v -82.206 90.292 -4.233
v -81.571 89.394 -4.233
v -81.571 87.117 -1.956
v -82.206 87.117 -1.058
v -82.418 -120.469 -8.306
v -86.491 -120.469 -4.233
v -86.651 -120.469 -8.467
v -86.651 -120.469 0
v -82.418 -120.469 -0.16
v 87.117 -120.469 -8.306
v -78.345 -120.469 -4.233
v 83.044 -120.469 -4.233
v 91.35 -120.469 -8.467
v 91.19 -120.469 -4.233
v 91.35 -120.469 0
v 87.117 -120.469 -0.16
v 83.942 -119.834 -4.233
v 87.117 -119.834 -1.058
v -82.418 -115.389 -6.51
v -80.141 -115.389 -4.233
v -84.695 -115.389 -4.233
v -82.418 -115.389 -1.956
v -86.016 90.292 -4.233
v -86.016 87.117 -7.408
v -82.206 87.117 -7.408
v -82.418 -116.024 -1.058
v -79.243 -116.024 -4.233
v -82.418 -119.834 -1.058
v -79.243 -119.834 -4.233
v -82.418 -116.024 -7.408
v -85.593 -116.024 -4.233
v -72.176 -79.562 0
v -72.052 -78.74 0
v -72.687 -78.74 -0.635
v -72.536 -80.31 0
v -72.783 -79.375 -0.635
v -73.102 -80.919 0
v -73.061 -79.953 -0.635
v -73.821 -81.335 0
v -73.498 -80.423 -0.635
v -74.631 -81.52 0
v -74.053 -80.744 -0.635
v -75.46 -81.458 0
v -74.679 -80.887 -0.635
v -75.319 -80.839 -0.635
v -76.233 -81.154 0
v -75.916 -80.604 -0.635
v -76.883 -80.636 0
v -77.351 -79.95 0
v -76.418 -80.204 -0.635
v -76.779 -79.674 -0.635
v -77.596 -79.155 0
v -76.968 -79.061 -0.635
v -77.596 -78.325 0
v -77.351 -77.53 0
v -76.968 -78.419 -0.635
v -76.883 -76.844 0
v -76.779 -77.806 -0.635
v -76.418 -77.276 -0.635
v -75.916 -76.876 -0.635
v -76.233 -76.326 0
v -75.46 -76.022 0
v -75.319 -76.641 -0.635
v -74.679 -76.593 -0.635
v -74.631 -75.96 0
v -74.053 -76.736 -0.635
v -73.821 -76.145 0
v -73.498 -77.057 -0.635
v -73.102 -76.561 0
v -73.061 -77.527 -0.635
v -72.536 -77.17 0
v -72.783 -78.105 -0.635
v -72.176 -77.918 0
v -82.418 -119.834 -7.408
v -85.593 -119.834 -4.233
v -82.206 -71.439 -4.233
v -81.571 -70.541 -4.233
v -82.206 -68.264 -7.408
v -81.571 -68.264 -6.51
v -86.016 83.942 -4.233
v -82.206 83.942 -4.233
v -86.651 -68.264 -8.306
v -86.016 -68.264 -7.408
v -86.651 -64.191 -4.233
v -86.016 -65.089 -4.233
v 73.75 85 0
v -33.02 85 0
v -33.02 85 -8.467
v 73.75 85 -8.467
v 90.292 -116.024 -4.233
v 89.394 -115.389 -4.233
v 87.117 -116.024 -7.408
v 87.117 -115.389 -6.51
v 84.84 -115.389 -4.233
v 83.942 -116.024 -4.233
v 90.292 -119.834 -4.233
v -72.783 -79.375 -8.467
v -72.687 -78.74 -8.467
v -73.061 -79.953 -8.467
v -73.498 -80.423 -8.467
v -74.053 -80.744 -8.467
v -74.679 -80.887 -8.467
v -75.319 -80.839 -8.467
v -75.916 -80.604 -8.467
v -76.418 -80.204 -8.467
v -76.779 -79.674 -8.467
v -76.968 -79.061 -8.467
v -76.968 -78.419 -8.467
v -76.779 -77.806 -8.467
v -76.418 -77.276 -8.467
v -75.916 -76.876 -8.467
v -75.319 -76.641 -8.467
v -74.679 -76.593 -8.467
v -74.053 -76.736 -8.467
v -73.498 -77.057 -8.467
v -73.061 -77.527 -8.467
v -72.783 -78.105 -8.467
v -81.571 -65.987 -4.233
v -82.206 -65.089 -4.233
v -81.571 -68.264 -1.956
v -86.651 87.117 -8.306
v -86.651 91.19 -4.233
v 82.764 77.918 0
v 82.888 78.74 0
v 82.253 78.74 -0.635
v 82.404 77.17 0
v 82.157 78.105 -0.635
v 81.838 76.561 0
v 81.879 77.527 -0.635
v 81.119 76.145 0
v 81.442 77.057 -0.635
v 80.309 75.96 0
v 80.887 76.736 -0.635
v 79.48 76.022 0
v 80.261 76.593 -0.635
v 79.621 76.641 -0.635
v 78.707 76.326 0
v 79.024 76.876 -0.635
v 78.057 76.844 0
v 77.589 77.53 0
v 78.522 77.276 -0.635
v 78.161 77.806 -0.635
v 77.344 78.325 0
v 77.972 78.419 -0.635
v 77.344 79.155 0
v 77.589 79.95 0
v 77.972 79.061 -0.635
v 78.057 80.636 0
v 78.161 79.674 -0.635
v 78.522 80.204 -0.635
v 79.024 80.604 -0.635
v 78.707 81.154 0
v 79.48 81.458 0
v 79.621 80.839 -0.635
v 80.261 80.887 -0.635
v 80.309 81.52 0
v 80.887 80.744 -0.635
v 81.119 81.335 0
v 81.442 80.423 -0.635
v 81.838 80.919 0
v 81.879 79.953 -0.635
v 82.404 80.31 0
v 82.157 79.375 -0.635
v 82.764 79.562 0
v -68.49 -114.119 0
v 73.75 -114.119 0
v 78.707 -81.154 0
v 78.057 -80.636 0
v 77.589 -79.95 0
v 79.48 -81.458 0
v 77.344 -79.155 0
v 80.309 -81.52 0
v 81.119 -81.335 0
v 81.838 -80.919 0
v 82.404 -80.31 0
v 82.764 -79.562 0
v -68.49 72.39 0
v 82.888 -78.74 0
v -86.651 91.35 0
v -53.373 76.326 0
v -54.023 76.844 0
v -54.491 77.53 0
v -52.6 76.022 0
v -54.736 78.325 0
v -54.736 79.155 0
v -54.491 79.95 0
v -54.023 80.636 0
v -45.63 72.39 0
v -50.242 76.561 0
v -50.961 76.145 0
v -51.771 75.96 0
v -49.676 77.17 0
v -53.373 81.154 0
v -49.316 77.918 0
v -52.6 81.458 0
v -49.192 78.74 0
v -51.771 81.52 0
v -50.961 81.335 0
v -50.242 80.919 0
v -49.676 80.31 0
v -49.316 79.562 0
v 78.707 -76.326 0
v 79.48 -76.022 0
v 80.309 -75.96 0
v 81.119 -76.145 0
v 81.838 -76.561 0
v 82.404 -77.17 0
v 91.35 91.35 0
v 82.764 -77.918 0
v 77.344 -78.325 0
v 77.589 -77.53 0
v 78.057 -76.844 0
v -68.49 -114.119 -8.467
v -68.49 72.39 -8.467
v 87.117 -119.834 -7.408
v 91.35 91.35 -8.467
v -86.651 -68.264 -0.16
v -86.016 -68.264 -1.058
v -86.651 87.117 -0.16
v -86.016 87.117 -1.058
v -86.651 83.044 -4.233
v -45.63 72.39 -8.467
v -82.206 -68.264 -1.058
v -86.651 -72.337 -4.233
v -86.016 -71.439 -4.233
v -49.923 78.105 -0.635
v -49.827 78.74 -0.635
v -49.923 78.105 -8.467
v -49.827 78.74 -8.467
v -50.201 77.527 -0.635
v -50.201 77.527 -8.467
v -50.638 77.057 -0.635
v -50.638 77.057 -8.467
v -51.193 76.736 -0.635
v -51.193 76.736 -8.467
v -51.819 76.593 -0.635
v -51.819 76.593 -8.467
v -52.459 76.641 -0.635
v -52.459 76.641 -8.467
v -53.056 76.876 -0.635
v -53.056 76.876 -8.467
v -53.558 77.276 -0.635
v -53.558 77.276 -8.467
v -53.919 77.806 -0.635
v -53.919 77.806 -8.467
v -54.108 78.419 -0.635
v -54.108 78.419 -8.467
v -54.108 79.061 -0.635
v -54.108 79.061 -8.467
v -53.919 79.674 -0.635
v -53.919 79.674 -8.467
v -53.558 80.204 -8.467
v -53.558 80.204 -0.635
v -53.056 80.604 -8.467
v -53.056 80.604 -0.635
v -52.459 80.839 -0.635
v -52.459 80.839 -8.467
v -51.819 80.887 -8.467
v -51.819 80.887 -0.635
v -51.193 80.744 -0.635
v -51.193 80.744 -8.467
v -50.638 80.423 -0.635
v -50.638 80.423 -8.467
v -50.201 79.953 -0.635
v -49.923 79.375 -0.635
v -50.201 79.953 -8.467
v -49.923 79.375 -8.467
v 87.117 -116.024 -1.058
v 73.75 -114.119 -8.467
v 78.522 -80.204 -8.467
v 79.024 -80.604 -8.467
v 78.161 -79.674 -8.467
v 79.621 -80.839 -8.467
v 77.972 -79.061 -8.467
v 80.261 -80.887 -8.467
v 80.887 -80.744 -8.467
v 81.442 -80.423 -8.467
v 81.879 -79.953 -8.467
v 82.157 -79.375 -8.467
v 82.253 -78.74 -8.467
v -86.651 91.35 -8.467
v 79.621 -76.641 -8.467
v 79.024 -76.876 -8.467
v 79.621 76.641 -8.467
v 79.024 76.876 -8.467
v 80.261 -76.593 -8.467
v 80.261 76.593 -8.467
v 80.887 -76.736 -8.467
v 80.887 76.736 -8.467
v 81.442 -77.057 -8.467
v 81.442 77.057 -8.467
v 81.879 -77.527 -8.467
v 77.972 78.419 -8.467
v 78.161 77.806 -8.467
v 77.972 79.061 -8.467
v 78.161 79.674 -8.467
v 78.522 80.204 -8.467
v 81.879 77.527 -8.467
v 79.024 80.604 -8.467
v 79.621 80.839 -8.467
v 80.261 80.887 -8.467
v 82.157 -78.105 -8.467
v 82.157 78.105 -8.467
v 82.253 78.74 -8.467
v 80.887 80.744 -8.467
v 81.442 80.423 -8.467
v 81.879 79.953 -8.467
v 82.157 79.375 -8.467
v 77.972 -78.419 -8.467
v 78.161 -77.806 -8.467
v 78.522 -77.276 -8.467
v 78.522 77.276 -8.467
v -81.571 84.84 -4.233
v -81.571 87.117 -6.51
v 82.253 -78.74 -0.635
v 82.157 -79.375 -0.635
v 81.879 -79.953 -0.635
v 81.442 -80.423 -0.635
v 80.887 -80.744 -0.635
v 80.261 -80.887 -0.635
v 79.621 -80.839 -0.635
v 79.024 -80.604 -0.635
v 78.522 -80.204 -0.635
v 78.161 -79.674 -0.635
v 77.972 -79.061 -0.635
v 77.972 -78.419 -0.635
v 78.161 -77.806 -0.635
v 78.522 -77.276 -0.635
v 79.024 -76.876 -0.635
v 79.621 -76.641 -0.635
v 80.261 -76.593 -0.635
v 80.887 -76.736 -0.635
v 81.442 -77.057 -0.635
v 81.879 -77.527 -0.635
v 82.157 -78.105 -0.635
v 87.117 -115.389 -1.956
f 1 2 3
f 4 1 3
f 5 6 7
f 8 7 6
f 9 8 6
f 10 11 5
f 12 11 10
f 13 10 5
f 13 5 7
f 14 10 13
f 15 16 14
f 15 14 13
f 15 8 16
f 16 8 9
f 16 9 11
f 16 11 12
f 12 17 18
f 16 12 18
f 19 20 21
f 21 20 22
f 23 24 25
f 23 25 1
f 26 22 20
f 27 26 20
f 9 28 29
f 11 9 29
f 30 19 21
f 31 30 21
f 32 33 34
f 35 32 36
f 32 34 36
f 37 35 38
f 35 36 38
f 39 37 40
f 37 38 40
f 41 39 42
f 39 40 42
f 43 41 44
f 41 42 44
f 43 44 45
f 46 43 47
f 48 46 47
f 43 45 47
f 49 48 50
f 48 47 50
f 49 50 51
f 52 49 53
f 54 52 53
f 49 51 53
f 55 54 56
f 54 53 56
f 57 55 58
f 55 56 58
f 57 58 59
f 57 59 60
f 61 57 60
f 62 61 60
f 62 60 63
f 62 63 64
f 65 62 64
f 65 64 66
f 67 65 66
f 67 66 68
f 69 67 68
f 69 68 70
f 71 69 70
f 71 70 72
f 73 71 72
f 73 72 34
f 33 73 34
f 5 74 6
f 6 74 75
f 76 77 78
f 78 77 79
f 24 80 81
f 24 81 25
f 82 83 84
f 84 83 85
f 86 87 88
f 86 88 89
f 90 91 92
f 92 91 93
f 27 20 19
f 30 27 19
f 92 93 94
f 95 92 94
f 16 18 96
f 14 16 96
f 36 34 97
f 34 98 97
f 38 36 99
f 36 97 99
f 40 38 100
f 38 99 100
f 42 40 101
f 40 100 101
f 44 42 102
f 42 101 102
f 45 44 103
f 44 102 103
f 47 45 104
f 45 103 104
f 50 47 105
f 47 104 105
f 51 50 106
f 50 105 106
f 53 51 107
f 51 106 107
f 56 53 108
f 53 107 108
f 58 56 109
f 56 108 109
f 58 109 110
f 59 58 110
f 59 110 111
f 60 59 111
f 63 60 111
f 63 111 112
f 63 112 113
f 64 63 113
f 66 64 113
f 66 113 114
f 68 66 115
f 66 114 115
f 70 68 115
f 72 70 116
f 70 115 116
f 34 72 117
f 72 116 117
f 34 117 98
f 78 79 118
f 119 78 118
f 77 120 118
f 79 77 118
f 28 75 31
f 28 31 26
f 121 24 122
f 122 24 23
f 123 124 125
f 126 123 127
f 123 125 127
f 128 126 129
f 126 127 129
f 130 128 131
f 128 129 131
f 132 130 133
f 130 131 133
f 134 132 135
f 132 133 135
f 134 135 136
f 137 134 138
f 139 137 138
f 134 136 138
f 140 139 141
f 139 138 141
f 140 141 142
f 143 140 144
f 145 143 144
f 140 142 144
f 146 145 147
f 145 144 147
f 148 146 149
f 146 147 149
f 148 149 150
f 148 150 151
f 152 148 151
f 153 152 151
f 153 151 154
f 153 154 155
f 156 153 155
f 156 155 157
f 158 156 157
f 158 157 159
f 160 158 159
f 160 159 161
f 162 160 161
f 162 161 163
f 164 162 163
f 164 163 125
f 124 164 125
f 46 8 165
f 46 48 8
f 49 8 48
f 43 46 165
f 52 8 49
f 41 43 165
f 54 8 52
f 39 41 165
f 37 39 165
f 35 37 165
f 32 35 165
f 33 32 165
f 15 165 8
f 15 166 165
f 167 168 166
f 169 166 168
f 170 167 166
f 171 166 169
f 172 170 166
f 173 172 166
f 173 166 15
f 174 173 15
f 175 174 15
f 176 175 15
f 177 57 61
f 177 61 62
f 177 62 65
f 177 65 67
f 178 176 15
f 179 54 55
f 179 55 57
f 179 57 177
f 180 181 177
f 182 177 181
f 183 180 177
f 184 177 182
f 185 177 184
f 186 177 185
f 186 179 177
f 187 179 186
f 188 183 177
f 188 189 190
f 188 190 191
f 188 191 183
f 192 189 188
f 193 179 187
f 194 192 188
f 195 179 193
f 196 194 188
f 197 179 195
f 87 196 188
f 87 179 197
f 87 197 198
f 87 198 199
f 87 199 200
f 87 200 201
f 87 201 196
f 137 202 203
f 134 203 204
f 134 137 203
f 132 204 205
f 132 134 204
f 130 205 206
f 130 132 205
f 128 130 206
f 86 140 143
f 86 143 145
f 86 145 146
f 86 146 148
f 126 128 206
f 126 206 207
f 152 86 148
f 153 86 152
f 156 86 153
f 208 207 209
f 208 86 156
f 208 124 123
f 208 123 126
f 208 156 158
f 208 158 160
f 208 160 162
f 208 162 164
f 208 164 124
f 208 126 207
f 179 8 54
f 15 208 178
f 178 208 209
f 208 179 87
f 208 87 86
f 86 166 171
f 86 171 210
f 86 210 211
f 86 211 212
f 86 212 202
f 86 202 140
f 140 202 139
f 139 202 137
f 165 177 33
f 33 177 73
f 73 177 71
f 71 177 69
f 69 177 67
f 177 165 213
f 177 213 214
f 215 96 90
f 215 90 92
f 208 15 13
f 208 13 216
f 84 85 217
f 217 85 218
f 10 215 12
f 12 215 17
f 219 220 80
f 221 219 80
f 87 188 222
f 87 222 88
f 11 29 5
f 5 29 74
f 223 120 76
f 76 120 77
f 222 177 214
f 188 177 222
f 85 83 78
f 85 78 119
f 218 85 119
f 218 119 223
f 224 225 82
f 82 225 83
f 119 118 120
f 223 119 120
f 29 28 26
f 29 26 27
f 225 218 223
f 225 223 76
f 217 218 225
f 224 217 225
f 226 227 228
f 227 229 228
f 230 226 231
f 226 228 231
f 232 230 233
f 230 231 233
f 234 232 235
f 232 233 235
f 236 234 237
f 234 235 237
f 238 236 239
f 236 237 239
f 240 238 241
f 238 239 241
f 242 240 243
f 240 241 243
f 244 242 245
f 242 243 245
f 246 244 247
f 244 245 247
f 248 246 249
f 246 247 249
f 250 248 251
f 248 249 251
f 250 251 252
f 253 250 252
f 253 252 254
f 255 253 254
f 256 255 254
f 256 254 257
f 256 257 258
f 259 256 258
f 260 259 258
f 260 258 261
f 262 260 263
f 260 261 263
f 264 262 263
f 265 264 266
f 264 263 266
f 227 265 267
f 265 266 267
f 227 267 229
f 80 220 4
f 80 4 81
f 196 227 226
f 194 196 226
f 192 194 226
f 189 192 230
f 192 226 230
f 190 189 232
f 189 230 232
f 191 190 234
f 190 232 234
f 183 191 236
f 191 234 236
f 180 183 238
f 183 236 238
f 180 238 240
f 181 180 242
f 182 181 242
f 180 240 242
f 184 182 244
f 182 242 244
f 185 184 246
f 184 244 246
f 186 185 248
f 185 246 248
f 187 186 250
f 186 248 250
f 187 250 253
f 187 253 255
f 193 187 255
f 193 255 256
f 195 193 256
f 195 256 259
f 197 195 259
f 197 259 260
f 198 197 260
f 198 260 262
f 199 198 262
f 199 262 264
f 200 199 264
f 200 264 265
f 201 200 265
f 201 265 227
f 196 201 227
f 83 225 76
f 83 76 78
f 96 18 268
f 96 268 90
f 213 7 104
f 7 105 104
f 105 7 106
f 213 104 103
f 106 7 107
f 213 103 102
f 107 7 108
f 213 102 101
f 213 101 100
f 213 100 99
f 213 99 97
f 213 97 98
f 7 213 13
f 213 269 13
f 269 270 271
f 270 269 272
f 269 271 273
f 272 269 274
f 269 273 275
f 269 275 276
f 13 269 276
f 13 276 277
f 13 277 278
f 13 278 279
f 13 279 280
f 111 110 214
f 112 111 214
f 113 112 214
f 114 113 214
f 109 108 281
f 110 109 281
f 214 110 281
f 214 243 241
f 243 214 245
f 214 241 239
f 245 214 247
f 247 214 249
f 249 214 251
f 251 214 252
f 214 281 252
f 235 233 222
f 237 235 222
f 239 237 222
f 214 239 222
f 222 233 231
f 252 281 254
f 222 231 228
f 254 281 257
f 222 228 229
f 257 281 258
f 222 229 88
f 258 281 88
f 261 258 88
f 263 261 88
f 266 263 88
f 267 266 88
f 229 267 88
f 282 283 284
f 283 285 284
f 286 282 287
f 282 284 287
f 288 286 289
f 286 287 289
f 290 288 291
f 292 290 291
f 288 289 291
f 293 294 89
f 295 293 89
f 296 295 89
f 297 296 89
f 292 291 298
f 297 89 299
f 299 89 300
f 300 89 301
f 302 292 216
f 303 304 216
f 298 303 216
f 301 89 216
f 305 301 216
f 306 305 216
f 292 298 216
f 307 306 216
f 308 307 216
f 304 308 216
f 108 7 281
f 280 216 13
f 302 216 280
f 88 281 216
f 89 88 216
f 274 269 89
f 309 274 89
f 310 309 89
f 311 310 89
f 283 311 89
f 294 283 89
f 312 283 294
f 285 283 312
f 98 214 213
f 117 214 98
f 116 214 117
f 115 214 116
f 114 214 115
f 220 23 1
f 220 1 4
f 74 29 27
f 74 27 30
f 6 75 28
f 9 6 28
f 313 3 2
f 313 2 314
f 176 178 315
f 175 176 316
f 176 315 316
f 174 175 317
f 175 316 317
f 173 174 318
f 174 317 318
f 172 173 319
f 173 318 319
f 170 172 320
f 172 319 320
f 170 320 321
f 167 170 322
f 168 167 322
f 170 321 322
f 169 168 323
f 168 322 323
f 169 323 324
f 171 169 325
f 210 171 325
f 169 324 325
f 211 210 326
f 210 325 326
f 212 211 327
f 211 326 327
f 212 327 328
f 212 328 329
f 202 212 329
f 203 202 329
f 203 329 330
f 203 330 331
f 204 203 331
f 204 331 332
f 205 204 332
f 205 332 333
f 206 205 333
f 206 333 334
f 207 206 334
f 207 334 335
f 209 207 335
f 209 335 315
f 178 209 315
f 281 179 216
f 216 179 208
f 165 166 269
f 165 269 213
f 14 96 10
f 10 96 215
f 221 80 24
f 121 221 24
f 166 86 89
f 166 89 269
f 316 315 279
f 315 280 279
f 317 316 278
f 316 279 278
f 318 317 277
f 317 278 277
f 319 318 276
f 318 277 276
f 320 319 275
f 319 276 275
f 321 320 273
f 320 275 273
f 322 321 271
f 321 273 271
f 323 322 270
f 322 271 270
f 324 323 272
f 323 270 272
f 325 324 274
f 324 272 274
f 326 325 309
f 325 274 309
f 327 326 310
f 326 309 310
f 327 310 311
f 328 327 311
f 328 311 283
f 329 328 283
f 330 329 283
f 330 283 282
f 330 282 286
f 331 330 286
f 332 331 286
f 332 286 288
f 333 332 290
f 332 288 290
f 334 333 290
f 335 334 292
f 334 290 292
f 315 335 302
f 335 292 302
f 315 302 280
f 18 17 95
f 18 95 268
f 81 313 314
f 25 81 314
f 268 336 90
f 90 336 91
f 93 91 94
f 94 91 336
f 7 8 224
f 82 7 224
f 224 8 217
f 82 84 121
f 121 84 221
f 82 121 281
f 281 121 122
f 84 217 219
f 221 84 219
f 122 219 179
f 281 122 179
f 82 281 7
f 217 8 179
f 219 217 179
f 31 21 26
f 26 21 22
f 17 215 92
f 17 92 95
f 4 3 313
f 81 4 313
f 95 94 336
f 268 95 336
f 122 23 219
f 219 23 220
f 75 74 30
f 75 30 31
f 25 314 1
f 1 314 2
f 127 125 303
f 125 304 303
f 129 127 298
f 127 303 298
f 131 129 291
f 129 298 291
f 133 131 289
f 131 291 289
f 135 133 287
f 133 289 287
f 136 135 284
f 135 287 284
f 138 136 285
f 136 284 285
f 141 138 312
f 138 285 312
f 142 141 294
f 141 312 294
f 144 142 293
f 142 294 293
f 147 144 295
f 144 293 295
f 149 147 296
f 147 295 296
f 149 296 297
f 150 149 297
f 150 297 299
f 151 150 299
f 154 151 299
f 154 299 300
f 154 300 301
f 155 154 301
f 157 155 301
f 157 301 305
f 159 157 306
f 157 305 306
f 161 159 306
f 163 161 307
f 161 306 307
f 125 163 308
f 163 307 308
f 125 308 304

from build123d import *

# Parameters (mm, degrees)
SKETCH3_W                              = 178.001
SKETCH3_H                              = 211.818599984
BOSS_EXTRUDE1_DEPTH                    = 8.466666582
F_18_0_1695_DIAMETER_HOLE1_D           = 4.3053
F_18_0_1695_DIAMETER_HOLE1_CSINK_D     = 5.5753
F_18_0_1695_DIAMETER_HOLE1_CSINK_ANGLE = 90
CUT_EXTRUDE1_DEPTH                     = 5.08
CUT_EXTRUDE2_DEPTH                     = 5.08
CHAMFER1_SIZE                          = 0.635


with BuildPart() as part:
    # Sketch3 → Boss-Extrude1 (new body)
    with BuildSketch(Plane.XY):
        with Locations((2.3495, -14.559299992)):
            Rectangle(SKETCH3_W, SKETCH3_H)
        Polygon((-33.01966, 85), (73.75034, 85), (73.75034, -114.118599984), (-68.48966, -114.118599984), (-68.48966, 72.39), (-45.62966, 72.39), align=None, mode=Mode.SUBTRACT)
    extrude(amount=-BOSS_EXTRUDE1_DEPTH)

    # #18 (0.1695) Diameter Hole1 (through all)
    with Locations(Plane(origin=(0, 0, 0), x_dir=(-1, 0, 0), z_dir=(0, 0, 1))):
        with Locations((51.97966, -78.74), (74.83966, 78.74), (-80.10034, 78.74), (-80.10034, -78.74)):
            CounterSinkHole(F_18_0_1695_DIAMETER_HOLE1_D / 2, F_18_0_1695_DIAMETER_HOLE1_CSINK_D / 2, counter_sink_angle=F_18_0_1695_DIAMETER_HOLE1_CSINK_ANGLE)

    # Sketch9 → Cut-Extrude1 (cut)
    with BuildSketch(Plane.ZY.offset(86.651)):
        Polygon((-4.233333333, -65.0886), (-1.058333333, -68.2636), (-4.233333333, -71.4386), (-7.408333333, -68.2636), align=None)
        Polygon((-4.233333333, 90.291666667), (-1.058333333, 87.116666667), (-4.233333333, 83.941666667), (-7.408333333, 87.116666667), align=None)
    extrude(amount=-CUT_EXTRUDE1_DEPTH, mode=Mode.SUBTRACT)

    # Sketch10 → Cut-Extrude2 (cut)
    with BuildSketch(Plane.XZ.offset(120.468599984)):
        Polygon((-85.592666667, -4.233333333), (-82.417666667, -1.058333333), (-79.242666667, -4.233333333), (-82.417666667, -7.408333333), align=None)
        Polygon((83.941666667, -4.233333333), (87.116666667, -1.058333333), (90.291666667, -4.233333333), (87.116666667, -7.408333333), align=None)
    extrude(amount=-CUT_EXTRUDE2_DEPTH, mode=Mode.SUBTRACT)

    # Chamfer1
    chamfer1_edges = [part.edges().sort_by_distance(p)[0] for p in [
        (88.704166667, -115.388599984, -2.645833333),
        (88.704166667, -115.388599984, -5.820833333),
        (85.529166667, -120.468599984, -5.820833333),
        (88.704166667, -120.468599984, -5.820833333),
        (88.704166667, -120.468599984, -2.645833333),
        (85.529166667, -120.468599984, -2.645833333),
        (-81.571, -66.6761, -5.820833333),
        (-81.571, -66.6761, -2.645833333),
        (-81.571, -69.8511, -2.645833333),
        (-81.571, -69.8511, -5.820833333),
        (-86.651, -66.6761, -5.820833333),
        (-86.651, -69.8511, -5.820833333),
        (-86.651, -69.8511, -2.645833333),
        (-86.651, -66.6761, -2.645833333),
        (-81.571, 88.704166667, -5.820833333),
        (-81.571, 88.704166667, -2.645833333),
        (-81.571, 85.529166667, -2.645833333),
        (-81.571, 85.529166667, -5.820833333),
        (-86.651, 88.704166667, -5.820833333),
        (-86.651, 85.529166667, -5.820833333),
        (-86.651, 85.529166667, -2.645833333),
        (-86.651, 88.704166667, -2.645833333),
        (-84.005166667, -115.388599984, -5.820833333),
        (-84.005166667, -115.388599984, -2.645833333),
        (-80.830166667, -115.388599984, -2.645833333),
        (-80.830166667, -115.388599984, -5.820833333),
        (-84.005166667, -120.468599984, -5.820833333),
        (-80.830166667, -120.468599984, -5.820833333),
        (-80.830166667, -120.468599984, -2.645833333),
        (-84.005166667, -120.468599984, -2.645833333),
        (85.529166667, -115.388599984, -5.820833333),
        (85.529166667, -115.388599984, -2.645833333),
    ]]
    chamfer(chamfer1_edges, length=CHAMFER1_SIZE)


solid = part.part
